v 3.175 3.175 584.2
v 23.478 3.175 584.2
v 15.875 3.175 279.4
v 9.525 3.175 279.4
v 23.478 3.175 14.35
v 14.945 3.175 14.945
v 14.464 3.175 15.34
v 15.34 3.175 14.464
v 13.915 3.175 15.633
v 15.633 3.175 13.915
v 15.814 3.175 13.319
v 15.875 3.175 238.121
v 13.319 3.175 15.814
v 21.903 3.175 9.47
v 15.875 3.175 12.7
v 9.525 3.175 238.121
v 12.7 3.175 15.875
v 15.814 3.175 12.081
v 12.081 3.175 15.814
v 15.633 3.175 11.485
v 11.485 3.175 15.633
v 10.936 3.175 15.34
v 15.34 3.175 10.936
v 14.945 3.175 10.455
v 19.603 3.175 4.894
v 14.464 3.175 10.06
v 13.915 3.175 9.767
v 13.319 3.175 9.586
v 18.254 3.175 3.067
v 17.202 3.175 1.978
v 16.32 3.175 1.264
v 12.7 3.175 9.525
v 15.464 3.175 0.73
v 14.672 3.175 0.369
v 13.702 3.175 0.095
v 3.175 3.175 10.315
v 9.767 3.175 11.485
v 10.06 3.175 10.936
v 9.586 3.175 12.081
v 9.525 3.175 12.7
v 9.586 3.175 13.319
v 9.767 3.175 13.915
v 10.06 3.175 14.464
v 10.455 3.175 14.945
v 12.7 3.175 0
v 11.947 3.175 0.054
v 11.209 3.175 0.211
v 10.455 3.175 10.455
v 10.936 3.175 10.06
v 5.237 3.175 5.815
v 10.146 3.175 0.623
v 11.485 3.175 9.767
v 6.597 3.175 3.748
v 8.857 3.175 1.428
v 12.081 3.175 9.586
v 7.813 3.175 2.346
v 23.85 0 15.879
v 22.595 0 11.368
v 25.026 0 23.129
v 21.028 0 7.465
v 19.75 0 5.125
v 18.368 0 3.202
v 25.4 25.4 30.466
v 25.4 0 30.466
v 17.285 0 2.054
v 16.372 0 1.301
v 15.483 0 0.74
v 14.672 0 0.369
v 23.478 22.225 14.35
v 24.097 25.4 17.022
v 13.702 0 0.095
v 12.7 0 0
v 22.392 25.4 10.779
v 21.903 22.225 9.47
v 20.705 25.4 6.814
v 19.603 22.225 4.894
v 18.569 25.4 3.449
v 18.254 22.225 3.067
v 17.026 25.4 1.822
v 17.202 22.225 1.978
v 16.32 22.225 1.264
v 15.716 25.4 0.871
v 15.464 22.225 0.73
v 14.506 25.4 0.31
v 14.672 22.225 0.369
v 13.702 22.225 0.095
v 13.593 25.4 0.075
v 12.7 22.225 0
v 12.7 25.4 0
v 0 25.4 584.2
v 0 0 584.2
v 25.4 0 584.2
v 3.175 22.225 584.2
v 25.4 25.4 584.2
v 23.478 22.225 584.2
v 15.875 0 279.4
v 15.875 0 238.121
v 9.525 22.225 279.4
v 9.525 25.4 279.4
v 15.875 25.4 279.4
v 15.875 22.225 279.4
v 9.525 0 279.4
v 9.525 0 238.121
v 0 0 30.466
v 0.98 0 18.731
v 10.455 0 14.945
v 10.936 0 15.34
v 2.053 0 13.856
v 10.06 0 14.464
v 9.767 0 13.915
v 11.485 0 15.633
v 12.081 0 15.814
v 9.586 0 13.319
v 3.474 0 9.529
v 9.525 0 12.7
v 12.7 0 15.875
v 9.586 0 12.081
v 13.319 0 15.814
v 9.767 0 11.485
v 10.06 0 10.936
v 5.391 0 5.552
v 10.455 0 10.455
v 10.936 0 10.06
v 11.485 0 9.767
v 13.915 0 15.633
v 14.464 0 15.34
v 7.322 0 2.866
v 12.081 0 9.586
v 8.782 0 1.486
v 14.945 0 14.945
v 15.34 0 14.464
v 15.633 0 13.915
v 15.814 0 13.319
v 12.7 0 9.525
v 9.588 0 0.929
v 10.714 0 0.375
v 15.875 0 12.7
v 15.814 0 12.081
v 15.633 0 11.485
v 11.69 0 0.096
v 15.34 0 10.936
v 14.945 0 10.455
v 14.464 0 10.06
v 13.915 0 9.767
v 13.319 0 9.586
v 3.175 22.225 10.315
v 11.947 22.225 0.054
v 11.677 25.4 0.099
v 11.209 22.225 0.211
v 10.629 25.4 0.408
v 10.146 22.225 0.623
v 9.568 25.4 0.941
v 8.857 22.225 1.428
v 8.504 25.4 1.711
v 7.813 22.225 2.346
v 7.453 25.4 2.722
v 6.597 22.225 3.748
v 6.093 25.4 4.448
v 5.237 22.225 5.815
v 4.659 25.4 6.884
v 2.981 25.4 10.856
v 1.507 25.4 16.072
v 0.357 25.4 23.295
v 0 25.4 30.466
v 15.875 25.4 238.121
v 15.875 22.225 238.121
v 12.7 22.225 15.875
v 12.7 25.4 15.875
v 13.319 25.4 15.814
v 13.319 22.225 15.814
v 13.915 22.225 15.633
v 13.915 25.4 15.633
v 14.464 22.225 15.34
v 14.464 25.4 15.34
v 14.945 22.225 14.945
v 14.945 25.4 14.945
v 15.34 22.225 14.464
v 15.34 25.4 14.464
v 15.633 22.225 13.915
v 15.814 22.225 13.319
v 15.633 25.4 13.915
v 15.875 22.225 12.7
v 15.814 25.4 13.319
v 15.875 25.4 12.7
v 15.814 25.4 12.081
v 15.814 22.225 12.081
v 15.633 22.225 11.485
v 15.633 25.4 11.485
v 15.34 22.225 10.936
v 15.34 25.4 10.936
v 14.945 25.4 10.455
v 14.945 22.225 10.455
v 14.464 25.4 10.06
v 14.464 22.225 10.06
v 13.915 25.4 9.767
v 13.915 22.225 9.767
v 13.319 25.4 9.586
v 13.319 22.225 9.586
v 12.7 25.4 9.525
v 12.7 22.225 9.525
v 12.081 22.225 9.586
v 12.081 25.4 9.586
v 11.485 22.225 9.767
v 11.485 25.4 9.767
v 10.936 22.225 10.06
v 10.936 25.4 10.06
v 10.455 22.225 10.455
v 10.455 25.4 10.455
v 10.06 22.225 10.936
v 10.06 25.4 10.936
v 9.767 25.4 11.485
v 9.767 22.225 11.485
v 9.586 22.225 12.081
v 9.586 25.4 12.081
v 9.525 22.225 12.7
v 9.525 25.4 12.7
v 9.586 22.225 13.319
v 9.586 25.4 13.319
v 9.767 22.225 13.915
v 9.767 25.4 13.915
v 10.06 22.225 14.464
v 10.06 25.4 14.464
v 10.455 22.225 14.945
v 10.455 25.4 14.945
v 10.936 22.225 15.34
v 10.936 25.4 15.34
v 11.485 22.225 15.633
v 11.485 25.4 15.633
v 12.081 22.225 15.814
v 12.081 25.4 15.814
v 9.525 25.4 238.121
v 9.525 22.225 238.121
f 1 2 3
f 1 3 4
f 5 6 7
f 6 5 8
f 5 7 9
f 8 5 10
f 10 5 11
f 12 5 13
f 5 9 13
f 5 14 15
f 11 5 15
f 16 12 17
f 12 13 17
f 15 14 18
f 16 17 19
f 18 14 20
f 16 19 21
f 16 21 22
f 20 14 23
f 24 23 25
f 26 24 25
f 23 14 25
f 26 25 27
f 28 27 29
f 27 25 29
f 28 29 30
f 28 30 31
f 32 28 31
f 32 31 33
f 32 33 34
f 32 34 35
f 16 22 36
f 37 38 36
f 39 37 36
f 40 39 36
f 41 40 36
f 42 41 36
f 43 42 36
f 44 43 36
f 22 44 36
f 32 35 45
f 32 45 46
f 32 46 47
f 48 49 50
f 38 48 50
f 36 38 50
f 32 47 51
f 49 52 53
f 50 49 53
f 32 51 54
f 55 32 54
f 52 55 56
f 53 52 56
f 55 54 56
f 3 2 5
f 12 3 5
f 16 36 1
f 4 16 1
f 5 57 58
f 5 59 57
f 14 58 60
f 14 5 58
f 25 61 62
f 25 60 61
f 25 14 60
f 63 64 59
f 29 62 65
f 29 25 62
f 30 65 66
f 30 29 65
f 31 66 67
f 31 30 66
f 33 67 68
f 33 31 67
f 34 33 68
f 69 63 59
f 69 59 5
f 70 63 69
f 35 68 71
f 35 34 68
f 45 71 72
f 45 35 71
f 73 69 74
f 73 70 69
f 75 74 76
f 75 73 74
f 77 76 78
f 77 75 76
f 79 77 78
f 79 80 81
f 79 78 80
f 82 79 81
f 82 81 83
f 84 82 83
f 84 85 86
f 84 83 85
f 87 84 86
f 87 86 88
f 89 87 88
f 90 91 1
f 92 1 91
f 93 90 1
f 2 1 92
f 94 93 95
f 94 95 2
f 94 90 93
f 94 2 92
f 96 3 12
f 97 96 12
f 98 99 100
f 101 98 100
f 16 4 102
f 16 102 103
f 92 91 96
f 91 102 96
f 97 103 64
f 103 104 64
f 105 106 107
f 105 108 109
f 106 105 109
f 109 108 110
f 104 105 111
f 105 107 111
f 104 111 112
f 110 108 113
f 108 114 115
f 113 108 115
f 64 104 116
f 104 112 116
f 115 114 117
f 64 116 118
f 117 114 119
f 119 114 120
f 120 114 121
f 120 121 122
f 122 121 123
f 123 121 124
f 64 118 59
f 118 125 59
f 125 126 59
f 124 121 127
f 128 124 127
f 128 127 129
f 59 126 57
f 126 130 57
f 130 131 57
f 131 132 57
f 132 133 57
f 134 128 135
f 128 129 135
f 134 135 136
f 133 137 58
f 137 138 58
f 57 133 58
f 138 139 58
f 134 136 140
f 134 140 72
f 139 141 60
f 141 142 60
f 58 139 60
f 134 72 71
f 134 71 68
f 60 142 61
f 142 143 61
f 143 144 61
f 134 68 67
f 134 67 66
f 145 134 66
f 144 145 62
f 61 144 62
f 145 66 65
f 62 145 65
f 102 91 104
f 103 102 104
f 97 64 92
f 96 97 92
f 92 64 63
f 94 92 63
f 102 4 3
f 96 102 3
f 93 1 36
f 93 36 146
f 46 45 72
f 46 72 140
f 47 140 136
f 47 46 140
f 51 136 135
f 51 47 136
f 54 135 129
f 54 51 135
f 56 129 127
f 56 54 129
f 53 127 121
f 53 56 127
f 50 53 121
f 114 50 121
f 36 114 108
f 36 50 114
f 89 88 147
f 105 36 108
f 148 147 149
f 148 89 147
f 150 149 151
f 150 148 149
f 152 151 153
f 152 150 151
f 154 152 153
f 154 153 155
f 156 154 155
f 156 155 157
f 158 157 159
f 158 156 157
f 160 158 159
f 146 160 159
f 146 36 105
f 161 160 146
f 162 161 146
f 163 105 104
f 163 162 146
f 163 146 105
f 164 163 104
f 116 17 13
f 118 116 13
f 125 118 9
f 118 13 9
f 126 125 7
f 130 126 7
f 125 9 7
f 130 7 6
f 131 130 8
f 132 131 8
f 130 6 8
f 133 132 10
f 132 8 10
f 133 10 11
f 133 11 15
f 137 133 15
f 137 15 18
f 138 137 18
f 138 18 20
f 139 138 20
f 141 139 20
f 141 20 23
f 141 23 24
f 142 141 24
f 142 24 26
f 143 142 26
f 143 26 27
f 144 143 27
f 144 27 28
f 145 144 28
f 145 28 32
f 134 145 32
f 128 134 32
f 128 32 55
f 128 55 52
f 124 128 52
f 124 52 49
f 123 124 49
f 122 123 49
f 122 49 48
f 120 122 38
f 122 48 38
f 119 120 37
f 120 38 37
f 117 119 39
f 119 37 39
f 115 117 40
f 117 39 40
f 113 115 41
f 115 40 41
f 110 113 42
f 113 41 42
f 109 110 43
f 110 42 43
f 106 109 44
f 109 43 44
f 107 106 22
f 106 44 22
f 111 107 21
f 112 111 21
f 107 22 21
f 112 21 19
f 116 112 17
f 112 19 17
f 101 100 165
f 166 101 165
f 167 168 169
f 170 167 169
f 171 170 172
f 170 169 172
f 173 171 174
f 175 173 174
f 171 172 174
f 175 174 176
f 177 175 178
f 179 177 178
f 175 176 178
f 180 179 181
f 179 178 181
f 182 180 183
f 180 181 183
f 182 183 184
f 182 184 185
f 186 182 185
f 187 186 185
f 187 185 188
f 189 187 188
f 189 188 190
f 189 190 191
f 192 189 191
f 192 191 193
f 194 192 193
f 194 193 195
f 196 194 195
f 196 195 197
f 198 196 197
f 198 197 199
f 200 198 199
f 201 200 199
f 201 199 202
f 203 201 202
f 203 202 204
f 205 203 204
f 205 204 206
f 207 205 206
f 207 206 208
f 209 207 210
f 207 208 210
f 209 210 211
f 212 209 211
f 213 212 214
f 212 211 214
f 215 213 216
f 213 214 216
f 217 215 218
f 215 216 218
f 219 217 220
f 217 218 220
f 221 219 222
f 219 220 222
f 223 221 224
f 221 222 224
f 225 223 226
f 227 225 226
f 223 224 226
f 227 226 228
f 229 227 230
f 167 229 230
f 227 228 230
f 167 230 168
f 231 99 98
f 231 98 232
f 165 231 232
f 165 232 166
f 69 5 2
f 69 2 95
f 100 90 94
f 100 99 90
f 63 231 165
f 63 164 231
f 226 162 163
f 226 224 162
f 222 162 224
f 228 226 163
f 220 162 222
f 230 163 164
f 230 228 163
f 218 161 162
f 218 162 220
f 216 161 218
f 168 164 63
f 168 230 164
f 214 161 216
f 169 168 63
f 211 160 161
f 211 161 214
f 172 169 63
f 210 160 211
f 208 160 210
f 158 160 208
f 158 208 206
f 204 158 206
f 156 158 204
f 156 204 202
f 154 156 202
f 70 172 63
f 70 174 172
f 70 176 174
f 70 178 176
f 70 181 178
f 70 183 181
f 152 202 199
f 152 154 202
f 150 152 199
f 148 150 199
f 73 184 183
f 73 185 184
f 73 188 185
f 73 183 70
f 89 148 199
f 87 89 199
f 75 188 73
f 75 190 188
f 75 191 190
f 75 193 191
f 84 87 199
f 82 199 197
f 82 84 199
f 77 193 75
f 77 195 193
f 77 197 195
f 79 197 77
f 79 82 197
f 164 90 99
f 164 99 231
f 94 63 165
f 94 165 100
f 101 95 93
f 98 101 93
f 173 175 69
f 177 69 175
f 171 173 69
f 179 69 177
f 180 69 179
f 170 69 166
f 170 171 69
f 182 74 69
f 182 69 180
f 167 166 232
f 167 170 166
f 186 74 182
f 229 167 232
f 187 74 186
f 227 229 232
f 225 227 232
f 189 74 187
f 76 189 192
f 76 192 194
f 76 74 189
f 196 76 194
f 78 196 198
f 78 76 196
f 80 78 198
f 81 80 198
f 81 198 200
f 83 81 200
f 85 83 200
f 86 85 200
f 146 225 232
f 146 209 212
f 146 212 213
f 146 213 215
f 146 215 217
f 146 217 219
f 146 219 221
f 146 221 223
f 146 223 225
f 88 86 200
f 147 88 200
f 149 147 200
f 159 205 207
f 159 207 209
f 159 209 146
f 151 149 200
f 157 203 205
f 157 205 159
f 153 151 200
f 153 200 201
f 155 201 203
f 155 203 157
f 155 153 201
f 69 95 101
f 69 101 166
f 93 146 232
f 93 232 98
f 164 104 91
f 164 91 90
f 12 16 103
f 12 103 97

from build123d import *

# Parameters (mm, degrees)
SKETCH1_W           = 25.4
SKETCH1_H           = 25.4
BOSS_EXTRUDE2_DEPTH = 584.2
SKETCH2_W           = 20.302766191
SKETCH2_H           = 19.05
CUT_EXTRUDE1_DEPTH  = 586.303305988
CUT_EXTRUDE2_DEPTH  = 586.303305988
SKETCH6_R           = 3.175
CUT_EXTRUDE5_DEPTH  = 586.303306096
SKETCH4_W           = 6.35
SKETCH4_H           = 41.278824243
CUT_EXTRUDE6_DEPTH  = 586.303306096


with BuildPart() as part:
    # Sketch1 → Boss-Extrude2 (new body)
    with BuildSketch(Plane.XY):
        with Locations((12.7, 12.7)):
            Rectangle(SKETCH1_W, SKETCH1_H)
    extrude(amount=BOSS_EXTRUDE2_DEPTH)

    # Sketch2 → Cut-Extrude1 (cut, through all)
    with BuildSketch(Plane(origin=(0, 0, 0), x_dir=(-1, 0, 0), z_dir=(0, 0, -1))):
        with Locations((-13.326383096, 12.7)):
            Rectangle(SKETCH2_W, SKETCH2_H)
    extrude(amount=-CUT_EXTRUDE1_DEPTH, mode=Mode.SUBTRACT)

    # Sketch3 → Cut-Extrude2 (cut, through all)
    with BuildSketch(Plane(origin=(0, 25.4, 0), x_dir=(1, 0, 0), z_dir=(0, 1, 0))):
        with BuildLine():
            add(Edge.make_bspline(
                [(12.7, 0), (0, 0), (0, -30.465860076)],
                knots=[6.283185307, 6.283185307, 6.283185307, 7.853981634, 7.853981634, 7.853981634], degree=2, weights=[1, 0.707106781, 1]))
            Line((12.7, 0), (0, 0))
            Line((0, 0), (0, -30.465860076))
        make_face()
        with BuildLine():
            Line((25.4, 0), (12.7, 0))
            add(Edge.make_bspline(
                [(25.4, -30.465860076), (25.4, 0), (12.7, 0)],
                knots=[4.71238898, 4.71238898, 4.71238898, 6.283185307, 6.283185307, 6.283185307], degree=2, weights=[1, 0.707106781, 1]))
            Line((25.4, -30.465860076), (25.4, 0))
        make_face()
    extrude(amount=-CUT_EXTRUDE2_DEPTH, mode=Mode.SUBTRACT)

    # Sketch6 → Cut-Extrude5 (cut, through all)
    with BuildSketch(Plane(origin=(0, 25.4, 0), x_dir=(1, 0, 0), z_dir=(0, 1, 0))):
        with Locations(Location((12.7, -12.7, 0), (0, 0, 270))):
            Circle(SKETCH6_R)
    extrude(amount=-CUT_EXTRUDE5_DEPTH, mode=Mode.SUBTRACT)

    # Sketch4 → Cut-Extrude6 (cut, through all)
    with BuildSketch(Plane(origin=(0, 25.4, 0), x_dir=(1, 0, 0), z_dir=(0, 1, 0))):
        with Locations((12.7, -258.760587879)):
            Rectangle(SKETCH4_W, SKETCH4_H)
    extrude(amount=-CUT_EXTRUDE6_DEPTH, mode=Mode.SUBTRACT)


solid = part.part
